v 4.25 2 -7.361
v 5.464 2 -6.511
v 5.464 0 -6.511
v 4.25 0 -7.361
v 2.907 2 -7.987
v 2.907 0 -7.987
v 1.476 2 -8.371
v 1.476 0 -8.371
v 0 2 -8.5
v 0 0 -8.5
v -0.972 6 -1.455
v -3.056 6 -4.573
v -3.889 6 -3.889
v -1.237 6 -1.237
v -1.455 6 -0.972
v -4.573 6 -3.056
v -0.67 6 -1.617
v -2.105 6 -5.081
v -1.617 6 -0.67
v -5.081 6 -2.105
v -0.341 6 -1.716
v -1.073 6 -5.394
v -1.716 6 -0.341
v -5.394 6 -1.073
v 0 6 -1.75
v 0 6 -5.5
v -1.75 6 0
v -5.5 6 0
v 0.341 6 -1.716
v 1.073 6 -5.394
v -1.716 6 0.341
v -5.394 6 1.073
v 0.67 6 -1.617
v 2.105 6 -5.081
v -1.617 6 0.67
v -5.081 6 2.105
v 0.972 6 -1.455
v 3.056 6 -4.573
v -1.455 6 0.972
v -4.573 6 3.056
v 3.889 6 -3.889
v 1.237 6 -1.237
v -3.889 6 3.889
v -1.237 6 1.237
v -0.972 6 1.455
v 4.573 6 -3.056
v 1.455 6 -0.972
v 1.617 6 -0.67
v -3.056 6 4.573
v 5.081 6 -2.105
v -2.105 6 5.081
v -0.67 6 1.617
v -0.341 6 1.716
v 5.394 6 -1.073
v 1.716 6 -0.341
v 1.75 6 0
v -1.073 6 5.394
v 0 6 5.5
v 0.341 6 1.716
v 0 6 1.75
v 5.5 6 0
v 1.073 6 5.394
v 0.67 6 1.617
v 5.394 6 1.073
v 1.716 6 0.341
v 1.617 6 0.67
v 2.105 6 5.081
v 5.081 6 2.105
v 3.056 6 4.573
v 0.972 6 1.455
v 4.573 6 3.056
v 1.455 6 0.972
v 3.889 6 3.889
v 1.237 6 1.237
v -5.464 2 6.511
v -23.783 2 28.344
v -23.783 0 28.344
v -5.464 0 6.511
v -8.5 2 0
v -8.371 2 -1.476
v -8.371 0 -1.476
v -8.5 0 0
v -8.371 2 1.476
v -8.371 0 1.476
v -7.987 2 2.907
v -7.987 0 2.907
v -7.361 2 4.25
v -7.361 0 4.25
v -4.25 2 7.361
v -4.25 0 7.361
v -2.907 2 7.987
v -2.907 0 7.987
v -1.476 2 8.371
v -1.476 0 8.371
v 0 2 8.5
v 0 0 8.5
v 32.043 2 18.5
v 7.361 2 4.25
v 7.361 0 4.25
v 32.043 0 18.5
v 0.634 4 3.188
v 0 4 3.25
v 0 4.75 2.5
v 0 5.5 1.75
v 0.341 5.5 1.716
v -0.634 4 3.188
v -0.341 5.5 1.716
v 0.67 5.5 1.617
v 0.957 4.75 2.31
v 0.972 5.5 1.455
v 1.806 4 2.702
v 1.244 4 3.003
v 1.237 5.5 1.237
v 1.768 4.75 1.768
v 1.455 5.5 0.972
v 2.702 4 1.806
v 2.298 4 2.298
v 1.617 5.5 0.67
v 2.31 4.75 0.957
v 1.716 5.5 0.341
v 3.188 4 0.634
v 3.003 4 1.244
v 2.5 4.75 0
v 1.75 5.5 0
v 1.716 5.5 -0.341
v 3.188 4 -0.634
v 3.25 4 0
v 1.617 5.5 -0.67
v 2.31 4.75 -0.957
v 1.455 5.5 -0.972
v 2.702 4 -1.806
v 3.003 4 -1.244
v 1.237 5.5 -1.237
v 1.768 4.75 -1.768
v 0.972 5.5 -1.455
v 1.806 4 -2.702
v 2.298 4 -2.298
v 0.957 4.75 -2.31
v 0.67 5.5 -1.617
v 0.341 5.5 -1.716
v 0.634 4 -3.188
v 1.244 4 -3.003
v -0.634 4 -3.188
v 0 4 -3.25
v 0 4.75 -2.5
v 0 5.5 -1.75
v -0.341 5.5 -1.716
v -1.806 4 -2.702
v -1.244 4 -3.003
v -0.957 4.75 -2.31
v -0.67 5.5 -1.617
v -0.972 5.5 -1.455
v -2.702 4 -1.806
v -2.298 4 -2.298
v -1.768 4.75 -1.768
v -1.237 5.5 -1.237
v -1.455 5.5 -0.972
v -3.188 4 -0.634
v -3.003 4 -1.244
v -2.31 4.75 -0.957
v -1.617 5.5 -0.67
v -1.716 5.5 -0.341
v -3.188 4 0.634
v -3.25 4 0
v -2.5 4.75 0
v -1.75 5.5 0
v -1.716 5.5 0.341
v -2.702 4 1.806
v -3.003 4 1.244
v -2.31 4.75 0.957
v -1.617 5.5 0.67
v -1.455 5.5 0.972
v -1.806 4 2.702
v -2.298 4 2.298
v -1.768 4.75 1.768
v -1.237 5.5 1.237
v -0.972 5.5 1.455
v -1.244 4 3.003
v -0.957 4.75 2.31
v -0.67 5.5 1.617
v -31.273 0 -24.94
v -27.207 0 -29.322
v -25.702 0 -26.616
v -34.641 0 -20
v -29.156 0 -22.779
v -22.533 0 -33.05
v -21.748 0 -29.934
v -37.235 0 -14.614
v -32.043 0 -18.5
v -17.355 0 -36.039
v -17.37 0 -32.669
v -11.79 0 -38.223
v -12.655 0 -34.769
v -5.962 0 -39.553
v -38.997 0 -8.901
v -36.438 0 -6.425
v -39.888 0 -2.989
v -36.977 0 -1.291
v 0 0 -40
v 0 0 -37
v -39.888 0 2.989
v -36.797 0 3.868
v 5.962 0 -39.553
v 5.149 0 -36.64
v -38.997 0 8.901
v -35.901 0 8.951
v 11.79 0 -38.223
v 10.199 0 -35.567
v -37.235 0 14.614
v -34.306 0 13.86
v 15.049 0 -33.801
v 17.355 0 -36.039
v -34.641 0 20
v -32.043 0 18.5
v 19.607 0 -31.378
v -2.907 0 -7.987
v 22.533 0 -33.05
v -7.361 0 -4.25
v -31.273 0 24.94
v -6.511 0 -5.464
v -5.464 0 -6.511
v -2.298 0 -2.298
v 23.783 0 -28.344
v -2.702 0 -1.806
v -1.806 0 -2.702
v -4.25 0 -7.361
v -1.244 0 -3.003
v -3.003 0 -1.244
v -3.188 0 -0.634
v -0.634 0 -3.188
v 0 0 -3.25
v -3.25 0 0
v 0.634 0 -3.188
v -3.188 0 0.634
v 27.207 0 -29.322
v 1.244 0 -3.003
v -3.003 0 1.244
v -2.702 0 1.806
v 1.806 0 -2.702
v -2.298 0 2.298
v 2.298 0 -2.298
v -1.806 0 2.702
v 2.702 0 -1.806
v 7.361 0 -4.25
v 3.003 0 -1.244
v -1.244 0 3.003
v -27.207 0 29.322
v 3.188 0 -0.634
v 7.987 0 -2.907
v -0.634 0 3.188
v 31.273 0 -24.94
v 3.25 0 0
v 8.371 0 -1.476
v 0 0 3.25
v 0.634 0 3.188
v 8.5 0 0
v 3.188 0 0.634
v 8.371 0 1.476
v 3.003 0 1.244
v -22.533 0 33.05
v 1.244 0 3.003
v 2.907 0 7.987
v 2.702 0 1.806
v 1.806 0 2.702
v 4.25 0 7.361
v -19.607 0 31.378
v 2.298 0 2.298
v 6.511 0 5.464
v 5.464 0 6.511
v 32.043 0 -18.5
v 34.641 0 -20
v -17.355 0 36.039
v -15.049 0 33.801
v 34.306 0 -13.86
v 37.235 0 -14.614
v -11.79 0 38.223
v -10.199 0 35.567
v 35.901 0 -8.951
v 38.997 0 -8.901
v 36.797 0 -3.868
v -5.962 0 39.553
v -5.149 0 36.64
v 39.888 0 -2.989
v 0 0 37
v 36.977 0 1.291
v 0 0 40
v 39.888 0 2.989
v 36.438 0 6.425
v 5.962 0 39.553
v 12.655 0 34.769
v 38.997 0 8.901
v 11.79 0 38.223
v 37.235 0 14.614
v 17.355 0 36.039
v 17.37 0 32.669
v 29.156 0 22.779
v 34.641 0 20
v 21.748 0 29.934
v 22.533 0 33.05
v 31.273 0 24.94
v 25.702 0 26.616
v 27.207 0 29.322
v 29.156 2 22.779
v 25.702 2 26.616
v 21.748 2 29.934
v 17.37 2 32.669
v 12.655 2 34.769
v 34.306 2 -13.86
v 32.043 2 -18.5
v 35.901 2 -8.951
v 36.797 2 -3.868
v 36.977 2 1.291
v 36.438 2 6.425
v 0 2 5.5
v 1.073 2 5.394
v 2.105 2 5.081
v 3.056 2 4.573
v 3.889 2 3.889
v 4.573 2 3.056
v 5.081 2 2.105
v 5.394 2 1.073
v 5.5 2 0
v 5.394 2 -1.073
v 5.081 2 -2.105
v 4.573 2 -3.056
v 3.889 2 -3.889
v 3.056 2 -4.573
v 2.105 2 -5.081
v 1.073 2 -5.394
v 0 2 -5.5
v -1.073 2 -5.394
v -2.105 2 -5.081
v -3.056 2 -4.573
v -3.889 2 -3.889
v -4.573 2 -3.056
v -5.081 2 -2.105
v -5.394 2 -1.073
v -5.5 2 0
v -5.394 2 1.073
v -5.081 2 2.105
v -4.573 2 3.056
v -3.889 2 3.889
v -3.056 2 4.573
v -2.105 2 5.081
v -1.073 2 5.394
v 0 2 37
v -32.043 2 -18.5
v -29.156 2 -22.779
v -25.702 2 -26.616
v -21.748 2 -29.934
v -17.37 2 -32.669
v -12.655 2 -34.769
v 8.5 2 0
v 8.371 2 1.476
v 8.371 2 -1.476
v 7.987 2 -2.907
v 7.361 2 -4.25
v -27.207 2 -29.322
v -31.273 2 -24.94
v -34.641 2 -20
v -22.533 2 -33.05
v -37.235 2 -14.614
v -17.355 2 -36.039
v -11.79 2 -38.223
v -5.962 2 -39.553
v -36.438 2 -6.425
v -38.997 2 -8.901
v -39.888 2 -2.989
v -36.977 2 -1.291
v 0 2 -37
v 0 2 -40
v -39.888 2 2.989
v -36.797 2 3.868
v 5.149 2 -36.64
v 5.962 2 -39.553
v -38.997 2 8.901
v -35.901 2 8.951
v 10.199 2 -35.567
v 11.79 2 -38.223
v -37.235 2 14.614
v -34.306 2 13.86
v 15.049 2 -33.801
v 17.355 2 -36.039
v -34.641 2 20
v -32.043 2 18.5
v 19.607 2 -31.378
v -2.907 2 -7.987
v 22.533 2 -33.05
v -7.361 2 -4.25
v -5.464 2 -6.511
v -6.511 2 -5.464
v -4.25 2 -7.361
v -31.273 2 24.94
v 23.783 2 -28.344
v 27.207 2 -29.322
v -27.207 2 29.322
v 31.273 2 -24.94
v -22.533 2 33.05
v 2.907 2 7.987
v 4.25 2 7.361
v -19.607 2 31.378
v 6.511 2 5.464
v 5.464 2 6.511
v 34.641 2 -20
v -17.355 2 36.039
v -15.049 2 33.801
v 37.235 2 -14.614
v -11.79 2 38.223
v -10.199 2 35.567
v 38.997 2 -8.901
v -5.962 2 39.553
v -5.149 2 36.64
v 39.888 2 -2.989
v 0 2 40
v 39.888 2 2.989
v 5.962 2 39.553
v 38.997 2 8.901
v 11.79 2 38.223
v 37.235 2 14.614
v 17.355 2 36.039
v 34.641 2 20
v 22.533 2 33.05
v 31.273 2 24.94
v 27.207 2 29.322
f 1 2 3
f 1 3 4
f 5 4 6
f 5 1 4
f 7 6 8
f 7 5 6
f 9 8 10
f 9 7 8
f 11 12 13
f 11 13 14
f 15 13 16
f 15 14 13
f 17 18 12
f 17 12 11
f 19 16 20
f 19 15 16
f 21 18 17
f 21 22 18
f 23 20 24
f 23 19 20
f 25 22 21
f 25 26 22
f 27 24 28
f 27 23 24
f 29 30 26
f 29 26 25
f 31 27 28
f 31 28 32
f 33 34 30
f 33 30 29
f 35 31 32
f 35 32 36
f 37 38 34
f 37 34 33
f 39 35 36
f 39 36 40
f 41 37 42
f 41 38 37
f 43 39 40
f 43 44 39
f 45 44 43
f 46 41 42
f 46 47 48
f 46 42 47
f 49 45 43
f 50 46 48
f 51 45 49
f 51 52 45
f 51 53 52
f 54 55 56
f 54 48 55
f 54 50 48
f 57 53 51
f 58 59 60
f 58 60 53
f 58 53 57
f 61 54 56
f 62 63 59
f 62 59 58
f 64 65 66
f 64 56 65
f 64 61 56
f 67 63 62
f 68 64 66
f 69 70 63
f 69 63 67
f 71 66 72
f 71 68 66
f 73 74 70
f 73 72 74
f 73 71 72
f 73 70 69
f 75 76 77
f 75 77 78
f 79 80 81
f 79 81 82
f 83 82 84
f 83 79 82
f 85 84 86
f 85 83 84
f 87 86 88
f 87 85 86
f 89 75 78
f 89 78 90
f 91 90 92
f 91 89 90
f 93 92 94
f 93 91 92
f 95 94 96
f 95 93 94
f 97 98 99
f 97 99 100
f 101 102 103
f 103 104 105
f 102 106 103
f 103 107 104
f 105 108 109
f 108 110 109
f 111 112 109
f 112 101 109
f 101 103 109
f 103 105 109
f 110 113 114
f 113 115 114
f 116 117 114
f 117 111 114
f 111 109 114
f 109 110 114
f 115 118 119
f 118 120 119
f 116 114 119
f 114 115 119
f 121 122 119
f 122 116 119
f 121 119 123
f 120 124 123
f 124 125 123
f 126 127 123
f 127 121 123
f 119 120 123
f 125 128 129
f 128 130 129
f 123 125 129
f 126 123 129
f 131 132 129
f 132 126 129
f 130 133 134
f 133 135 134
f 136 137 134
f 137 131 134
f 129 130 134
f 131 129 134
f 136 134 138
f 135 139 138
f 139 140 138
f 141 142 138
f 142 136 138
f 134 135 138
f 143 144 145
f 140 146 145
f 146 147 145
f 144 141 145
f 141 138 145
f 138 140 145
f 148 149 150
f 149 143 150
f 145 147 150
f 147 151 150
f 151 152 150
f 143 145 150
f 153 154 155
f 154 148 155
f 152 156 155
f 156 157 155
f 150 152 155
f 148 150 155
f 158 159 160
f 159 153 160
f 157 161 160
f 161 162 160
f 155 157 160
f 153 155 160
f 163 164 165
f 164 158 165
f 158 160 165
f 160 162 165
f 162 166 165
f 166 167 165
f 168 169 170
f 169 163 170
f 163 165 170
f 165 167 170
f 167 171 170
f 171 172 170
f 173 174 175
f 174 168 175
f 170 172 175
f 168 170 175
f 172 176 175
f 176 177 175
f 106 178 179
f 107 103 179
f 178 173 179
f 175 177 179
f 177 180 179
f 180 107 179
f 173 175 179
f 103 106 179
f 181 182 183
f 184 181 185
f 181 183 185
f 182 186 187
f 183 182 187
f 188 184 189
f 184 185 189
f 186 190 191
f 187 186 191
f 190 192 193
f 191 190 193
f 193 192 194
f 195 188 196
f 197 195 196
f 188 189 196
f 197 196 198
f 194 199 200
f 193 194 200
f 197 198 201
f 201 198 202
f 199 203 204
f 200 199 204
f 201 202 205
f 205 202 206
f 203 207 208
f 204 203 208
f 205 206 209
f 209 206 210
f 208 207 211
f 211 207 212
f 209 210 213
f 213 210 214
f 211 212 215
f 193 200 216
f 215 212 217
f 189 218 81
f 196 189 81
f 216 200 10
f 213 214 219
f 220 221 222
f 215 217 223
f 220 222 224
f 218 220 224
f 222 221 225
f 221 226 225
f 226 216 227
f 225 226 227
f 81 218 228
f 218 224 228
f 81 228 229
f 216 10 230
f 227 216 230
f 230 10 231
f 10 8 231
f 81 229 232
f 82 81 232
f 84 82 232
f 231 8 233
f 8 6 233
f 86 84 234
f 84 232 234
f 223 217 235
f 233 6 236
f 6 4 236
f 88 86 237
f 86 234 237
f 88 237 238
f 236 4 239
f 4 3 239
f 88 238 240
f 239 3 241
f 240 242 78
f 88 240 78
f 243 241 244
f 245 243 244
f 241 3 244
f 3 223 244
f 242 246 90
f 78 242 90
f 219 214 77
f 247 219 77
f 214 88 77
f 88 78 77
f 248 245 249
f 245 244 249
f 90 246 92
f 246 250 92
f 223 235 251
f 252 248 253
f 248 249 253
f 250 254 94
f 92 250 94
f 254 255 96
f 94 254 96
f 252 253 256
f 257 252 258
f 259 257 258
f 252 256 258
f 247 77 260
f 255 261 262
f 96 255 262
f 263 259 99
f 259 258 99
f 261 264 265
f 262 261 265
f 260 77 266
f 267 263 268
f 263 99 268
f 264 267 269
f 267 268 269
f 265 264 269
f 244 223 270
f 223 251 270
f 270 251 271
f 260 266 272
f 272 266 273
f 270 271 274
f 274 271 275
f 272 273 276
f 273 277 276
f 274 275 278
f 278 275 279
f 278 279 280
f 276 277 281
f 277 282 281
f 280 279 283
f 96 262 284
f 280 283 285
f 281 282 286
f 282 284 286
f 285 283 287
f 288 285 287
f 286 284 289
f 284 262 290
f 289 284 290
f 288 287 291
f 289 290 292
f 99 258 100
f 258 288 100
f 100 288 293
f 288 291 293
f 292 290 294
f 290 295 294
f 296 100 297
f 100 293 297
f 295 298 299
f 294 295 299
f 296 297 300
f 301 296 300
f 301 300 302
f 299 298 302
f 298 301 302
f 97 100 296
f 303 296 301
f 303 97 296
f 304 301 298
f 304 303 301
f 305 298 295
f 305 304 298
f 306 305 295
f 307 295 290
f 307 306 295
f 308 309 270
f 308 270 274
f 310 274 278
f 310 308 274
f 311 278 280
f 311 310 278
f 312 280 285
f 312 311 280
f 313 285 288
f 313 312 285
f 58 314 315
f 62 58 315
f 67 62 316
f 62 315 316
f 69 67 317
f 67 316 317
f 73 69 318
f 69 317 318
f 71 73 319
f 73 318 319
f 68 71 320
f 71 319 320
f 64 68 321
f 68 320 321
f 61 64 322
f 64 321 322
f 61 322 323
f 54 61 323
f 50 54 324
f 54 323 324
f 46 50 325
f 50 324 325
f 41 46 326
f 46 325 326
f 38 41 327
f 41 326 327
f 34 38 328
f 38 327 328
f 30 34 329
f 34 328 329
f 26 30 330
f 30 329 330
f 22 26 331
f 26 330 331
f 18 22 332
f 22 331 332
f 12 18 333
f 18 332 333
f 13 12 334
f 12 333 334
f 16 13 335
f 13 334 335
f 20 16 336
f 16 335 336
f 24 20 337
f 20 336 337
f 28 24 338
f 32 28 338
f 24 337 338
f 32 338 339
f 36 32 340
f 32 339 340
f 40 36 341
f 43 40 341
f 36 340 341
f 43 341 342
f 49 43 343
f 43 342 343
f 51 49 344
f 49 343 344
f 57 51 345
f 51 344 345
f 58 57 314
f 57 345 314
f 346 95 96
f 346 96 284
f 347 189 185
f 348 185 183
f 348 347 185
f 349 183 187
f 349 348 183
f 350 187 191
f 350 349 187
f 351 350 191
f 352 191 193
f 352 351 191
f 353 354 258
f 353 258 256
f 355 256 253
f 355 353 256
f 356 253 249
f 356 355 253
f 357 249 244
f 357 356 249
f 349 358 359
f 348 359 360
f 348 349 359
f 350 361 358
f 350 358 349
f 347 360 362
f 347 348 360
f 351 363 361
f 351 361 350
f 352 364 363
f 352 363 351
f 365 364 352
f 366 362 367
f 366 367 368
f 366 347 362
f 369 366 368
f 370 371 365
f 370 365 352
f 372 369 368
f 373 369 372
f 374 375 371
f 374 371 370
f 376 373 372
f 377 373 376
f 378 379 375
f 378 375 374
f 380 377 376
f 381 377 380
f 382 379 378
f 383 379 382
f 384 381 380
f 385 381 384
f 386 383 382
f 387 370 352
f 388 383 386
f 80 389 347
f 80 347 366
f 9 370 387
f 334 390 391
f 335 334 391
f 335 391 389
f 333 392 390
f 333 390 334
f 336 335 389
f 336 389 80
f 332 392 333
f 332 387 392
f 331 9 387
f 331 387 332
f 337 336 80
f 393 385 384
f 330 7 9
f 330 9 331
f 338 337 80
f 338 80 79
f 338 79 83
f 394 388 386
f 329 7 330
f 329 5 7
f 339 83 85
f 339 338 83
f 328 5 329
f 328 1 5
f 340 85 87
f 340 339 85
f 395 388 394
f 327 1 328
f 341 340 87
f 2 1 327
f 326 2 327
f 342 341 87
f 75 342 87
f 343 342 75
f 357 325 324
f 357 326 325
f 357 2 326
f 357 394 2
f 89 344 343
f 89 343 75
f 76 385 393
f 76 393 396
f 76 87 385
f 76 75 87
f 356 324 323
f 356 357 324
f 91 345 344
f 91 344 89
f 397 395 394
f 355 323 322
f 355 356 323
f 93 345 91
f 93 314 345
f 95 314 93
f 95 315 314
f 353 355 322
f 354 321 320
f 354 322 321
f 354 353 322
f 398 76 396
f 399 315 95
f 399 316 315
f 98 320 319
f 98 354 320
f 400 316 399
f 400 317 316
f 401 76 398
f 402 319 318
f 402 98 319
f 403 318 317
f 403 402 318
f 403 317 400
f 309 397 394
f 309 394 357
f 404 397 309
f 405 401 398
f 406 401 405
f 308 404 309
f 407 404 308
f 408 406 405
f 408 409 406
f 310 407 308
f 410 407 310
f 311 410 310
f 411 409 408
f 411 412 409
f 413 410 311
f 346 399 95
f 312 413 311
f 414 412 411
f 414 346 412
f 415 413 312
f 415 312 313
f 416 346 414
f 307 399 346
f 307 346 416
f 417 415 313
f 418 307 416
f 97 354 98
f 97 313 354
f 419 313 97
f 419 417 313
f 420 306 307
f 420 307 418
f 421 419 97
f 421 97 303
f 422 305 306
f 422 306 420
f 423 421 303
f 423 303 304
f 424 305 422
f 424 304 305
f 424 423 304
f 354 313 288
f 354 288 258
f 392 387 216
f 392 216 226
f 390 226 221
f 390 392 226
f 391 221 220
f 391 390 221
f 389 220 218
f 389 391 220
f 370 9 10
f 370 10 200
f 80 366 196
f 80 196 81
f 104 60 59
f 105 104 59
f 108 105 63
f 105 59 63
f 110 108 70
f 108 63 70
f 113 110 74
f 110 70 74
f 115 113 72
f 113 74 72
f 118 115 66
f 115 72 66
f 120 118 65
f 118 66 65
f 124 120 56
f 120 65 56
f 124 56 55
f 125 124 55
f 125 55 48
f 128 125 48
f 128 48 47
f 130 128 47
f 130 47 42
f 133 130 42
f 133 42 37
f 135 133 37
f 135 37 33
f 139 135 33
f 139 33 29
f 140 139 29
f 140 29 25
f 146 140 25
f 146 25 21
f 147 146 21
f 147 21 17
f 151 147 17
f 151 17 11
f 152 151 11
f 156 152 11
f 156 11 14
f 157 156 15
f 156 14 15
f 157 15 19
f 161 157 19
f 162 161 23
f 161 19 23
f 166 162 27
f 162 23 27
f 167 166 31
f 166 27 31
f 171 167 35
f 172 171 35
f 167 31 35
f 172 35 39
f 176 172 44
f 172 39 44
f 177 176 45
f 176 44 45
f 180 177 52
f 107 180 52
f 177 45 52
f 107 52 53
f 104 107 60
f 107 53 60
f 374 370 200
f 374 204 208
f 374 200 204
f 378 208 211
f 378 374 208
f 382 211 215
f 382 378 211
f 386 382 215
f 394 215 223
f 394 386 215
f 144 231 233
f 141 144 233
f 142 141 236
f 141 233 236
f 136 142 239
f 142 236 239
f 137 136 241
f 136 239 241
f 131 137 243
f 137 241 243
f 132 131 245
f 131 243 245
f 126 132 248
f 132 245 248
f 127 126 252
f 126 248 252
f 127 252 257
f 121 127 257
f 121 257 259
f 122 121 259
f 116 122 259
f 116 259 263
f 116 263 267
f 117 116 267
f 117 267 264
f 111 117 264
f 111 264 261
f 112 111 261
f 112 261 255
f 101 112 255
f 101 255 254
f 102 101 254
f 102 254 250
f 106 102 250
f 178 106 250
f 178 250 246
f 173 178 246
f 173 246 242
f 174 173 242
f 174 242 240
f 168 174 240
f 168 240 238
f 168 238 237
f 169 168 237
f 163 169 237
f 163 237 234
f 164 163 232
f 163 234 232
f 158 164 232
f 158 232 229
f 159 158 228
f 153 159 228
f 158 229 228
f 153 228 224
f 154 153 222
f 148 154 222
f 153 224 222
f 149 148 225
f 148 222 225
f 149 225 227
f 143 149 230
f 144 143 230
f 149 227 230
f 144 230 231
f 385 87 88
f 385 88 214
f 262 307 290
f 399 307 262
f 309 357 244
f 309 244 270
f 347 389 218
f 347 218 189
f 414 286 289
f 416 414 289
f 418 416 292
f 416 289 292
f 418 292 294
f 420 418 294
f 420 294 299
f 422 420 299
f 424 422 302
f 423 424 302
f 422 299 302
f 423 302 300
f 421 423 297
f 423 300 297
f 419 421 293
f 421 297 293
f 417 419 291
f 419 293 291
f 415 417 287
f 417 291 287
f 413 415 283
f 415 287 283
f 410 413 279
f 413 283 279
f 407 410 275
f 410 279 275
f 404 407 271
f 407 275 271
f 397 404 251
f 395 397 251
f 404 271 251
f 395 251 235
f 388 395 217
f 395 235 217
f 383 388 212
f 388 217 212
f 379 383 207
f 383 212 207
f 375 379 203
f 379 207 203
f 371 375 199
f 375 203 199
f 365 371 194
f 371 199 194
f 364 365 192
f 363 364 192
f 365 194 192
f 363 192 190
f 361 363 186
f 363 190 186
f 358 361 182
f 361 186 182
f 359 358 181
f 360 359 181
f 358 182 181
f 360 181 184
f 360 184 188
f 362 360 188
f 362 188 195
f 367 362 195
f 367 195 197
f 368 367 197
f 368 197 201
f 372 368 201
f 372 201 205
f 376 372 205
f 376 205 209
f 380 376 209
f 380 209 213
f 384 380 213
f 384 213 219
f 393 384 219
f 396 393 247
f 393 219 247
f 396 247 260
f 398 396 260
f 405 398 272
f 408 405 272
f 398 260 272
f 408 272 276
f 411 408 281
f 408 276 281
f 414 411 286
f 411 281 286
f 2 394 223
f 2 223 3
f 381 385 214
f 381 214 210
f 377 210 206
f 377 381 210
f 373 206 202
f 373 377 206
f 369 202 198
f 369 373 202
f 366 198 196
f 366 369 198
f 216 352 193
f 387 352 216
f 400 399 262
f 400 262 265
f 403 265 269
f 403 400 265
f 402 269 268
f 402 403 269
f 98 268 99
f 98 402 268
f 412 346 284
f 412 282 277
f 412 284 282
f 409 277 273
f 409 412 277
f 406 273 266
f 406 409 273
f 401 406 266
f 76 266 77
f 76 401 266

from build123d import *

# Parameters (mm, degrees)
CROQUIS1_R              = 40
SALIENTE_EXTRUIR1_DEPTH = 2
CROQUIS2_R              = 5.5
SALIENTE_EXTRUIR2_DEPTH = 4
CROQUIS3_R              = 1.75
CORTAR_EXTRUIR1_DEPTH   = 57.885850613
CROQUIS4_R              = 3.25
CORTAR_EXTRUIR2_DEPTH   = 3.5
CHAFL_N1_SIZE           = 2
CORTAR_EXTRUIR3_DEPTH   = 57.709787515


with BuildPart() as part:
    # Croquis1 → Saliente-Extruir1 (new body)
    with BuildSketch(Plane(origin=(0, 0, 0), x_dir=(1, 0, 0), z_dir=(0, 1, 0))):
        with Locations(Location((0, 0, 0), (0, 0, 270))):
            Circle(CROQUIS1_R)
    extrude(amount=SALIENTE_EXTRUIR1_DEPTH)

    # Croquis2 → Saliente-Extruir2 (add)
    with BuildSketch(Plane(origin=(0, 2, 0), x_dir=(1, 0, 0), z_dir=(0, 1, 0))):
        with Locations(Location((0, 0, 0), (0, 0, 270))):
            Circle(CROQUIS2_R)
    extrude(amount=SALIENTE_EXTRUIR2_DEPTH)

    # Croquis3 → Cortar-Extruir1 (cut, through all)
    with BuildSketch(Plane(origin=(0, 6, 0), x_dir=(1, 0, 0), z_dir=(0, 1, 0))):
        with Locations(Location((0, 0, 0), (0, 0, 270))):
            Circle(CROQUIS3_R)
    extrude(amount=-CORTAR_EXTRUIR1_DEPTH, mode=Mode.SUBTRACT)

    # Croquis4 → Cortar-Extruir2 (cut)
    with BuildSketch(Plane(origin=(0, 0, 0), x_dir=(-1, 0, 0), z_dir=(0, -1, 0))):
        with Locations(Location((0, 0, 0), (0, 0, 90))):
            Circle(CROQUIS4_R)
    extrude(amount=-CORTAR_EXTRUIR2_DEPTH, mode=Mode.SUBTRACT)

    # Chaflán1
    # the kernel refuses this chamfer: 2 mm, written as the material it takes off along each edge
    with BuildSketch(Plane(origin=(0, 3.5, 0), x_dir=(0, 0, 1), z_dir=(-1, 0, 0))) as chafl_n1_piece_1_section:
        Polygon((1.75 + CHAFL_N1_SIZE, 0), (1.75, CHAFL_N1_SIZE), (1.75, 0), align=None)
    chafl_n1_piece_1 = revolve(axis=Axis((0, 3.5, 0), (0, 1, 0)), mode=Mode.PRIVATE)
    chafl_n1_piece_1 = chafl_n1_piece_1 & Plane(origin=(0, 4.756379489, 0), x_dir=(0, 0, -1), z_dir=(0, -1, 0)) * Cylinder(3.25, 15, mode=Mode.PRIVATE)
    add(chafl_n1_piece_1, mode=Mode.SUBTRACT)

    # Croquis5 → Cortar-Extruir3 (cut, through all)
    with BuildSketch(Plane(origin=(0, 2, 0), x_dir=(1, 0, 0), z_dir=(0, 1, 0))):
        with BuildLine():
            Line((0, 8.5), (0, 37))
            ThreePointArc((0, 37), (12.654745303, 34.768626969), (23.783141558, 28.343644395))
            Line((23.783141558, 28.343644395), (5.463694682, 6.511377767))
            ThreePointArc((5.463694682, 6.511377767), (2.907171218, 7.987387277), (0, 8.5))
        make_face()
        with BuildLine():
            Line((7.361215932, 4.25), (32.04293994, 18.5))
            ThreePointArc((32.04293994, 18.5), (36.437886861, 6.424982574), (36.437886861, -6.424982574))
            Line((36.437886861, -6.424982574), (8.370865901, -1.47600951))
            ThreePointArc((8.370865901, -1.47600951), (8.370865901, 1.47600951), (7.361215932, 4.25))
        make_face()
        with BuildLine():
            Line((7.361215932, -4.25), (32.04293994, -18.5))
            ThreePointArc((32.04293994, -18.5), (23.783141558, -28.343644395), (12.654745303, -34.768626969))
            Line((12.654745303, -34.768626969), (2.907171218, -7.987387277))
            ThreePointArc((2.907171218, -7.987387277), (5.463694682, -6.511377767), (7.361215932, -4.25))
        make_face()
        with BuildLine():
            Line((0, -8.5), (0, -37))
            ThreePointArc((0, -37), (-12.654745303, -34.768626969), (-23.783141558, -28.343644395))
            Line((-23.783141558, -28.343644395), (-5.463694682, -6.511377767))
            ThreePointArc((-5.463694682, -6.511377767), (-2.907171218, -7.987387277), (0, -8.5))
        make_face()
        with BuildLine():
            Line((-7.361215932, -4.25), (-32.04293994, -18.5))
            ThreePointArc((-32.04293994, -18.5), (-36.437886861, -6.424982574), (-36.437886861, 6.424982574))
            Line((-36.437886861, 6.424982574), (-8.370865901, 1.47600951))
            ThreePointArc((-8.370865901, 1.47600951), (-8.370865901, -1.47600951), (-7.361215932, -4.25))
        make_face()
        with BuildLine():
            Line((-7.361215932, 4.25), (-32.04293994, 18.5))
            ThreePointArc((-32.04293994, 18.5), (-23.783141558, 28.343644395), (-12.654745303, 34.768626969))
            Line((-12.654745303, 34.768626969), (-2.907171218, 7.987387277))
            ThreePointArc((-2.907171218, 7.987387277), (-5.463694682, 6.511377767), (-7.361215932, 4.25))
        make_face()
    extrude(amount=-CORTAR_EXTRUIR3_DEPTH, mode=Mode.SUBTRACT)


solid = part.part
